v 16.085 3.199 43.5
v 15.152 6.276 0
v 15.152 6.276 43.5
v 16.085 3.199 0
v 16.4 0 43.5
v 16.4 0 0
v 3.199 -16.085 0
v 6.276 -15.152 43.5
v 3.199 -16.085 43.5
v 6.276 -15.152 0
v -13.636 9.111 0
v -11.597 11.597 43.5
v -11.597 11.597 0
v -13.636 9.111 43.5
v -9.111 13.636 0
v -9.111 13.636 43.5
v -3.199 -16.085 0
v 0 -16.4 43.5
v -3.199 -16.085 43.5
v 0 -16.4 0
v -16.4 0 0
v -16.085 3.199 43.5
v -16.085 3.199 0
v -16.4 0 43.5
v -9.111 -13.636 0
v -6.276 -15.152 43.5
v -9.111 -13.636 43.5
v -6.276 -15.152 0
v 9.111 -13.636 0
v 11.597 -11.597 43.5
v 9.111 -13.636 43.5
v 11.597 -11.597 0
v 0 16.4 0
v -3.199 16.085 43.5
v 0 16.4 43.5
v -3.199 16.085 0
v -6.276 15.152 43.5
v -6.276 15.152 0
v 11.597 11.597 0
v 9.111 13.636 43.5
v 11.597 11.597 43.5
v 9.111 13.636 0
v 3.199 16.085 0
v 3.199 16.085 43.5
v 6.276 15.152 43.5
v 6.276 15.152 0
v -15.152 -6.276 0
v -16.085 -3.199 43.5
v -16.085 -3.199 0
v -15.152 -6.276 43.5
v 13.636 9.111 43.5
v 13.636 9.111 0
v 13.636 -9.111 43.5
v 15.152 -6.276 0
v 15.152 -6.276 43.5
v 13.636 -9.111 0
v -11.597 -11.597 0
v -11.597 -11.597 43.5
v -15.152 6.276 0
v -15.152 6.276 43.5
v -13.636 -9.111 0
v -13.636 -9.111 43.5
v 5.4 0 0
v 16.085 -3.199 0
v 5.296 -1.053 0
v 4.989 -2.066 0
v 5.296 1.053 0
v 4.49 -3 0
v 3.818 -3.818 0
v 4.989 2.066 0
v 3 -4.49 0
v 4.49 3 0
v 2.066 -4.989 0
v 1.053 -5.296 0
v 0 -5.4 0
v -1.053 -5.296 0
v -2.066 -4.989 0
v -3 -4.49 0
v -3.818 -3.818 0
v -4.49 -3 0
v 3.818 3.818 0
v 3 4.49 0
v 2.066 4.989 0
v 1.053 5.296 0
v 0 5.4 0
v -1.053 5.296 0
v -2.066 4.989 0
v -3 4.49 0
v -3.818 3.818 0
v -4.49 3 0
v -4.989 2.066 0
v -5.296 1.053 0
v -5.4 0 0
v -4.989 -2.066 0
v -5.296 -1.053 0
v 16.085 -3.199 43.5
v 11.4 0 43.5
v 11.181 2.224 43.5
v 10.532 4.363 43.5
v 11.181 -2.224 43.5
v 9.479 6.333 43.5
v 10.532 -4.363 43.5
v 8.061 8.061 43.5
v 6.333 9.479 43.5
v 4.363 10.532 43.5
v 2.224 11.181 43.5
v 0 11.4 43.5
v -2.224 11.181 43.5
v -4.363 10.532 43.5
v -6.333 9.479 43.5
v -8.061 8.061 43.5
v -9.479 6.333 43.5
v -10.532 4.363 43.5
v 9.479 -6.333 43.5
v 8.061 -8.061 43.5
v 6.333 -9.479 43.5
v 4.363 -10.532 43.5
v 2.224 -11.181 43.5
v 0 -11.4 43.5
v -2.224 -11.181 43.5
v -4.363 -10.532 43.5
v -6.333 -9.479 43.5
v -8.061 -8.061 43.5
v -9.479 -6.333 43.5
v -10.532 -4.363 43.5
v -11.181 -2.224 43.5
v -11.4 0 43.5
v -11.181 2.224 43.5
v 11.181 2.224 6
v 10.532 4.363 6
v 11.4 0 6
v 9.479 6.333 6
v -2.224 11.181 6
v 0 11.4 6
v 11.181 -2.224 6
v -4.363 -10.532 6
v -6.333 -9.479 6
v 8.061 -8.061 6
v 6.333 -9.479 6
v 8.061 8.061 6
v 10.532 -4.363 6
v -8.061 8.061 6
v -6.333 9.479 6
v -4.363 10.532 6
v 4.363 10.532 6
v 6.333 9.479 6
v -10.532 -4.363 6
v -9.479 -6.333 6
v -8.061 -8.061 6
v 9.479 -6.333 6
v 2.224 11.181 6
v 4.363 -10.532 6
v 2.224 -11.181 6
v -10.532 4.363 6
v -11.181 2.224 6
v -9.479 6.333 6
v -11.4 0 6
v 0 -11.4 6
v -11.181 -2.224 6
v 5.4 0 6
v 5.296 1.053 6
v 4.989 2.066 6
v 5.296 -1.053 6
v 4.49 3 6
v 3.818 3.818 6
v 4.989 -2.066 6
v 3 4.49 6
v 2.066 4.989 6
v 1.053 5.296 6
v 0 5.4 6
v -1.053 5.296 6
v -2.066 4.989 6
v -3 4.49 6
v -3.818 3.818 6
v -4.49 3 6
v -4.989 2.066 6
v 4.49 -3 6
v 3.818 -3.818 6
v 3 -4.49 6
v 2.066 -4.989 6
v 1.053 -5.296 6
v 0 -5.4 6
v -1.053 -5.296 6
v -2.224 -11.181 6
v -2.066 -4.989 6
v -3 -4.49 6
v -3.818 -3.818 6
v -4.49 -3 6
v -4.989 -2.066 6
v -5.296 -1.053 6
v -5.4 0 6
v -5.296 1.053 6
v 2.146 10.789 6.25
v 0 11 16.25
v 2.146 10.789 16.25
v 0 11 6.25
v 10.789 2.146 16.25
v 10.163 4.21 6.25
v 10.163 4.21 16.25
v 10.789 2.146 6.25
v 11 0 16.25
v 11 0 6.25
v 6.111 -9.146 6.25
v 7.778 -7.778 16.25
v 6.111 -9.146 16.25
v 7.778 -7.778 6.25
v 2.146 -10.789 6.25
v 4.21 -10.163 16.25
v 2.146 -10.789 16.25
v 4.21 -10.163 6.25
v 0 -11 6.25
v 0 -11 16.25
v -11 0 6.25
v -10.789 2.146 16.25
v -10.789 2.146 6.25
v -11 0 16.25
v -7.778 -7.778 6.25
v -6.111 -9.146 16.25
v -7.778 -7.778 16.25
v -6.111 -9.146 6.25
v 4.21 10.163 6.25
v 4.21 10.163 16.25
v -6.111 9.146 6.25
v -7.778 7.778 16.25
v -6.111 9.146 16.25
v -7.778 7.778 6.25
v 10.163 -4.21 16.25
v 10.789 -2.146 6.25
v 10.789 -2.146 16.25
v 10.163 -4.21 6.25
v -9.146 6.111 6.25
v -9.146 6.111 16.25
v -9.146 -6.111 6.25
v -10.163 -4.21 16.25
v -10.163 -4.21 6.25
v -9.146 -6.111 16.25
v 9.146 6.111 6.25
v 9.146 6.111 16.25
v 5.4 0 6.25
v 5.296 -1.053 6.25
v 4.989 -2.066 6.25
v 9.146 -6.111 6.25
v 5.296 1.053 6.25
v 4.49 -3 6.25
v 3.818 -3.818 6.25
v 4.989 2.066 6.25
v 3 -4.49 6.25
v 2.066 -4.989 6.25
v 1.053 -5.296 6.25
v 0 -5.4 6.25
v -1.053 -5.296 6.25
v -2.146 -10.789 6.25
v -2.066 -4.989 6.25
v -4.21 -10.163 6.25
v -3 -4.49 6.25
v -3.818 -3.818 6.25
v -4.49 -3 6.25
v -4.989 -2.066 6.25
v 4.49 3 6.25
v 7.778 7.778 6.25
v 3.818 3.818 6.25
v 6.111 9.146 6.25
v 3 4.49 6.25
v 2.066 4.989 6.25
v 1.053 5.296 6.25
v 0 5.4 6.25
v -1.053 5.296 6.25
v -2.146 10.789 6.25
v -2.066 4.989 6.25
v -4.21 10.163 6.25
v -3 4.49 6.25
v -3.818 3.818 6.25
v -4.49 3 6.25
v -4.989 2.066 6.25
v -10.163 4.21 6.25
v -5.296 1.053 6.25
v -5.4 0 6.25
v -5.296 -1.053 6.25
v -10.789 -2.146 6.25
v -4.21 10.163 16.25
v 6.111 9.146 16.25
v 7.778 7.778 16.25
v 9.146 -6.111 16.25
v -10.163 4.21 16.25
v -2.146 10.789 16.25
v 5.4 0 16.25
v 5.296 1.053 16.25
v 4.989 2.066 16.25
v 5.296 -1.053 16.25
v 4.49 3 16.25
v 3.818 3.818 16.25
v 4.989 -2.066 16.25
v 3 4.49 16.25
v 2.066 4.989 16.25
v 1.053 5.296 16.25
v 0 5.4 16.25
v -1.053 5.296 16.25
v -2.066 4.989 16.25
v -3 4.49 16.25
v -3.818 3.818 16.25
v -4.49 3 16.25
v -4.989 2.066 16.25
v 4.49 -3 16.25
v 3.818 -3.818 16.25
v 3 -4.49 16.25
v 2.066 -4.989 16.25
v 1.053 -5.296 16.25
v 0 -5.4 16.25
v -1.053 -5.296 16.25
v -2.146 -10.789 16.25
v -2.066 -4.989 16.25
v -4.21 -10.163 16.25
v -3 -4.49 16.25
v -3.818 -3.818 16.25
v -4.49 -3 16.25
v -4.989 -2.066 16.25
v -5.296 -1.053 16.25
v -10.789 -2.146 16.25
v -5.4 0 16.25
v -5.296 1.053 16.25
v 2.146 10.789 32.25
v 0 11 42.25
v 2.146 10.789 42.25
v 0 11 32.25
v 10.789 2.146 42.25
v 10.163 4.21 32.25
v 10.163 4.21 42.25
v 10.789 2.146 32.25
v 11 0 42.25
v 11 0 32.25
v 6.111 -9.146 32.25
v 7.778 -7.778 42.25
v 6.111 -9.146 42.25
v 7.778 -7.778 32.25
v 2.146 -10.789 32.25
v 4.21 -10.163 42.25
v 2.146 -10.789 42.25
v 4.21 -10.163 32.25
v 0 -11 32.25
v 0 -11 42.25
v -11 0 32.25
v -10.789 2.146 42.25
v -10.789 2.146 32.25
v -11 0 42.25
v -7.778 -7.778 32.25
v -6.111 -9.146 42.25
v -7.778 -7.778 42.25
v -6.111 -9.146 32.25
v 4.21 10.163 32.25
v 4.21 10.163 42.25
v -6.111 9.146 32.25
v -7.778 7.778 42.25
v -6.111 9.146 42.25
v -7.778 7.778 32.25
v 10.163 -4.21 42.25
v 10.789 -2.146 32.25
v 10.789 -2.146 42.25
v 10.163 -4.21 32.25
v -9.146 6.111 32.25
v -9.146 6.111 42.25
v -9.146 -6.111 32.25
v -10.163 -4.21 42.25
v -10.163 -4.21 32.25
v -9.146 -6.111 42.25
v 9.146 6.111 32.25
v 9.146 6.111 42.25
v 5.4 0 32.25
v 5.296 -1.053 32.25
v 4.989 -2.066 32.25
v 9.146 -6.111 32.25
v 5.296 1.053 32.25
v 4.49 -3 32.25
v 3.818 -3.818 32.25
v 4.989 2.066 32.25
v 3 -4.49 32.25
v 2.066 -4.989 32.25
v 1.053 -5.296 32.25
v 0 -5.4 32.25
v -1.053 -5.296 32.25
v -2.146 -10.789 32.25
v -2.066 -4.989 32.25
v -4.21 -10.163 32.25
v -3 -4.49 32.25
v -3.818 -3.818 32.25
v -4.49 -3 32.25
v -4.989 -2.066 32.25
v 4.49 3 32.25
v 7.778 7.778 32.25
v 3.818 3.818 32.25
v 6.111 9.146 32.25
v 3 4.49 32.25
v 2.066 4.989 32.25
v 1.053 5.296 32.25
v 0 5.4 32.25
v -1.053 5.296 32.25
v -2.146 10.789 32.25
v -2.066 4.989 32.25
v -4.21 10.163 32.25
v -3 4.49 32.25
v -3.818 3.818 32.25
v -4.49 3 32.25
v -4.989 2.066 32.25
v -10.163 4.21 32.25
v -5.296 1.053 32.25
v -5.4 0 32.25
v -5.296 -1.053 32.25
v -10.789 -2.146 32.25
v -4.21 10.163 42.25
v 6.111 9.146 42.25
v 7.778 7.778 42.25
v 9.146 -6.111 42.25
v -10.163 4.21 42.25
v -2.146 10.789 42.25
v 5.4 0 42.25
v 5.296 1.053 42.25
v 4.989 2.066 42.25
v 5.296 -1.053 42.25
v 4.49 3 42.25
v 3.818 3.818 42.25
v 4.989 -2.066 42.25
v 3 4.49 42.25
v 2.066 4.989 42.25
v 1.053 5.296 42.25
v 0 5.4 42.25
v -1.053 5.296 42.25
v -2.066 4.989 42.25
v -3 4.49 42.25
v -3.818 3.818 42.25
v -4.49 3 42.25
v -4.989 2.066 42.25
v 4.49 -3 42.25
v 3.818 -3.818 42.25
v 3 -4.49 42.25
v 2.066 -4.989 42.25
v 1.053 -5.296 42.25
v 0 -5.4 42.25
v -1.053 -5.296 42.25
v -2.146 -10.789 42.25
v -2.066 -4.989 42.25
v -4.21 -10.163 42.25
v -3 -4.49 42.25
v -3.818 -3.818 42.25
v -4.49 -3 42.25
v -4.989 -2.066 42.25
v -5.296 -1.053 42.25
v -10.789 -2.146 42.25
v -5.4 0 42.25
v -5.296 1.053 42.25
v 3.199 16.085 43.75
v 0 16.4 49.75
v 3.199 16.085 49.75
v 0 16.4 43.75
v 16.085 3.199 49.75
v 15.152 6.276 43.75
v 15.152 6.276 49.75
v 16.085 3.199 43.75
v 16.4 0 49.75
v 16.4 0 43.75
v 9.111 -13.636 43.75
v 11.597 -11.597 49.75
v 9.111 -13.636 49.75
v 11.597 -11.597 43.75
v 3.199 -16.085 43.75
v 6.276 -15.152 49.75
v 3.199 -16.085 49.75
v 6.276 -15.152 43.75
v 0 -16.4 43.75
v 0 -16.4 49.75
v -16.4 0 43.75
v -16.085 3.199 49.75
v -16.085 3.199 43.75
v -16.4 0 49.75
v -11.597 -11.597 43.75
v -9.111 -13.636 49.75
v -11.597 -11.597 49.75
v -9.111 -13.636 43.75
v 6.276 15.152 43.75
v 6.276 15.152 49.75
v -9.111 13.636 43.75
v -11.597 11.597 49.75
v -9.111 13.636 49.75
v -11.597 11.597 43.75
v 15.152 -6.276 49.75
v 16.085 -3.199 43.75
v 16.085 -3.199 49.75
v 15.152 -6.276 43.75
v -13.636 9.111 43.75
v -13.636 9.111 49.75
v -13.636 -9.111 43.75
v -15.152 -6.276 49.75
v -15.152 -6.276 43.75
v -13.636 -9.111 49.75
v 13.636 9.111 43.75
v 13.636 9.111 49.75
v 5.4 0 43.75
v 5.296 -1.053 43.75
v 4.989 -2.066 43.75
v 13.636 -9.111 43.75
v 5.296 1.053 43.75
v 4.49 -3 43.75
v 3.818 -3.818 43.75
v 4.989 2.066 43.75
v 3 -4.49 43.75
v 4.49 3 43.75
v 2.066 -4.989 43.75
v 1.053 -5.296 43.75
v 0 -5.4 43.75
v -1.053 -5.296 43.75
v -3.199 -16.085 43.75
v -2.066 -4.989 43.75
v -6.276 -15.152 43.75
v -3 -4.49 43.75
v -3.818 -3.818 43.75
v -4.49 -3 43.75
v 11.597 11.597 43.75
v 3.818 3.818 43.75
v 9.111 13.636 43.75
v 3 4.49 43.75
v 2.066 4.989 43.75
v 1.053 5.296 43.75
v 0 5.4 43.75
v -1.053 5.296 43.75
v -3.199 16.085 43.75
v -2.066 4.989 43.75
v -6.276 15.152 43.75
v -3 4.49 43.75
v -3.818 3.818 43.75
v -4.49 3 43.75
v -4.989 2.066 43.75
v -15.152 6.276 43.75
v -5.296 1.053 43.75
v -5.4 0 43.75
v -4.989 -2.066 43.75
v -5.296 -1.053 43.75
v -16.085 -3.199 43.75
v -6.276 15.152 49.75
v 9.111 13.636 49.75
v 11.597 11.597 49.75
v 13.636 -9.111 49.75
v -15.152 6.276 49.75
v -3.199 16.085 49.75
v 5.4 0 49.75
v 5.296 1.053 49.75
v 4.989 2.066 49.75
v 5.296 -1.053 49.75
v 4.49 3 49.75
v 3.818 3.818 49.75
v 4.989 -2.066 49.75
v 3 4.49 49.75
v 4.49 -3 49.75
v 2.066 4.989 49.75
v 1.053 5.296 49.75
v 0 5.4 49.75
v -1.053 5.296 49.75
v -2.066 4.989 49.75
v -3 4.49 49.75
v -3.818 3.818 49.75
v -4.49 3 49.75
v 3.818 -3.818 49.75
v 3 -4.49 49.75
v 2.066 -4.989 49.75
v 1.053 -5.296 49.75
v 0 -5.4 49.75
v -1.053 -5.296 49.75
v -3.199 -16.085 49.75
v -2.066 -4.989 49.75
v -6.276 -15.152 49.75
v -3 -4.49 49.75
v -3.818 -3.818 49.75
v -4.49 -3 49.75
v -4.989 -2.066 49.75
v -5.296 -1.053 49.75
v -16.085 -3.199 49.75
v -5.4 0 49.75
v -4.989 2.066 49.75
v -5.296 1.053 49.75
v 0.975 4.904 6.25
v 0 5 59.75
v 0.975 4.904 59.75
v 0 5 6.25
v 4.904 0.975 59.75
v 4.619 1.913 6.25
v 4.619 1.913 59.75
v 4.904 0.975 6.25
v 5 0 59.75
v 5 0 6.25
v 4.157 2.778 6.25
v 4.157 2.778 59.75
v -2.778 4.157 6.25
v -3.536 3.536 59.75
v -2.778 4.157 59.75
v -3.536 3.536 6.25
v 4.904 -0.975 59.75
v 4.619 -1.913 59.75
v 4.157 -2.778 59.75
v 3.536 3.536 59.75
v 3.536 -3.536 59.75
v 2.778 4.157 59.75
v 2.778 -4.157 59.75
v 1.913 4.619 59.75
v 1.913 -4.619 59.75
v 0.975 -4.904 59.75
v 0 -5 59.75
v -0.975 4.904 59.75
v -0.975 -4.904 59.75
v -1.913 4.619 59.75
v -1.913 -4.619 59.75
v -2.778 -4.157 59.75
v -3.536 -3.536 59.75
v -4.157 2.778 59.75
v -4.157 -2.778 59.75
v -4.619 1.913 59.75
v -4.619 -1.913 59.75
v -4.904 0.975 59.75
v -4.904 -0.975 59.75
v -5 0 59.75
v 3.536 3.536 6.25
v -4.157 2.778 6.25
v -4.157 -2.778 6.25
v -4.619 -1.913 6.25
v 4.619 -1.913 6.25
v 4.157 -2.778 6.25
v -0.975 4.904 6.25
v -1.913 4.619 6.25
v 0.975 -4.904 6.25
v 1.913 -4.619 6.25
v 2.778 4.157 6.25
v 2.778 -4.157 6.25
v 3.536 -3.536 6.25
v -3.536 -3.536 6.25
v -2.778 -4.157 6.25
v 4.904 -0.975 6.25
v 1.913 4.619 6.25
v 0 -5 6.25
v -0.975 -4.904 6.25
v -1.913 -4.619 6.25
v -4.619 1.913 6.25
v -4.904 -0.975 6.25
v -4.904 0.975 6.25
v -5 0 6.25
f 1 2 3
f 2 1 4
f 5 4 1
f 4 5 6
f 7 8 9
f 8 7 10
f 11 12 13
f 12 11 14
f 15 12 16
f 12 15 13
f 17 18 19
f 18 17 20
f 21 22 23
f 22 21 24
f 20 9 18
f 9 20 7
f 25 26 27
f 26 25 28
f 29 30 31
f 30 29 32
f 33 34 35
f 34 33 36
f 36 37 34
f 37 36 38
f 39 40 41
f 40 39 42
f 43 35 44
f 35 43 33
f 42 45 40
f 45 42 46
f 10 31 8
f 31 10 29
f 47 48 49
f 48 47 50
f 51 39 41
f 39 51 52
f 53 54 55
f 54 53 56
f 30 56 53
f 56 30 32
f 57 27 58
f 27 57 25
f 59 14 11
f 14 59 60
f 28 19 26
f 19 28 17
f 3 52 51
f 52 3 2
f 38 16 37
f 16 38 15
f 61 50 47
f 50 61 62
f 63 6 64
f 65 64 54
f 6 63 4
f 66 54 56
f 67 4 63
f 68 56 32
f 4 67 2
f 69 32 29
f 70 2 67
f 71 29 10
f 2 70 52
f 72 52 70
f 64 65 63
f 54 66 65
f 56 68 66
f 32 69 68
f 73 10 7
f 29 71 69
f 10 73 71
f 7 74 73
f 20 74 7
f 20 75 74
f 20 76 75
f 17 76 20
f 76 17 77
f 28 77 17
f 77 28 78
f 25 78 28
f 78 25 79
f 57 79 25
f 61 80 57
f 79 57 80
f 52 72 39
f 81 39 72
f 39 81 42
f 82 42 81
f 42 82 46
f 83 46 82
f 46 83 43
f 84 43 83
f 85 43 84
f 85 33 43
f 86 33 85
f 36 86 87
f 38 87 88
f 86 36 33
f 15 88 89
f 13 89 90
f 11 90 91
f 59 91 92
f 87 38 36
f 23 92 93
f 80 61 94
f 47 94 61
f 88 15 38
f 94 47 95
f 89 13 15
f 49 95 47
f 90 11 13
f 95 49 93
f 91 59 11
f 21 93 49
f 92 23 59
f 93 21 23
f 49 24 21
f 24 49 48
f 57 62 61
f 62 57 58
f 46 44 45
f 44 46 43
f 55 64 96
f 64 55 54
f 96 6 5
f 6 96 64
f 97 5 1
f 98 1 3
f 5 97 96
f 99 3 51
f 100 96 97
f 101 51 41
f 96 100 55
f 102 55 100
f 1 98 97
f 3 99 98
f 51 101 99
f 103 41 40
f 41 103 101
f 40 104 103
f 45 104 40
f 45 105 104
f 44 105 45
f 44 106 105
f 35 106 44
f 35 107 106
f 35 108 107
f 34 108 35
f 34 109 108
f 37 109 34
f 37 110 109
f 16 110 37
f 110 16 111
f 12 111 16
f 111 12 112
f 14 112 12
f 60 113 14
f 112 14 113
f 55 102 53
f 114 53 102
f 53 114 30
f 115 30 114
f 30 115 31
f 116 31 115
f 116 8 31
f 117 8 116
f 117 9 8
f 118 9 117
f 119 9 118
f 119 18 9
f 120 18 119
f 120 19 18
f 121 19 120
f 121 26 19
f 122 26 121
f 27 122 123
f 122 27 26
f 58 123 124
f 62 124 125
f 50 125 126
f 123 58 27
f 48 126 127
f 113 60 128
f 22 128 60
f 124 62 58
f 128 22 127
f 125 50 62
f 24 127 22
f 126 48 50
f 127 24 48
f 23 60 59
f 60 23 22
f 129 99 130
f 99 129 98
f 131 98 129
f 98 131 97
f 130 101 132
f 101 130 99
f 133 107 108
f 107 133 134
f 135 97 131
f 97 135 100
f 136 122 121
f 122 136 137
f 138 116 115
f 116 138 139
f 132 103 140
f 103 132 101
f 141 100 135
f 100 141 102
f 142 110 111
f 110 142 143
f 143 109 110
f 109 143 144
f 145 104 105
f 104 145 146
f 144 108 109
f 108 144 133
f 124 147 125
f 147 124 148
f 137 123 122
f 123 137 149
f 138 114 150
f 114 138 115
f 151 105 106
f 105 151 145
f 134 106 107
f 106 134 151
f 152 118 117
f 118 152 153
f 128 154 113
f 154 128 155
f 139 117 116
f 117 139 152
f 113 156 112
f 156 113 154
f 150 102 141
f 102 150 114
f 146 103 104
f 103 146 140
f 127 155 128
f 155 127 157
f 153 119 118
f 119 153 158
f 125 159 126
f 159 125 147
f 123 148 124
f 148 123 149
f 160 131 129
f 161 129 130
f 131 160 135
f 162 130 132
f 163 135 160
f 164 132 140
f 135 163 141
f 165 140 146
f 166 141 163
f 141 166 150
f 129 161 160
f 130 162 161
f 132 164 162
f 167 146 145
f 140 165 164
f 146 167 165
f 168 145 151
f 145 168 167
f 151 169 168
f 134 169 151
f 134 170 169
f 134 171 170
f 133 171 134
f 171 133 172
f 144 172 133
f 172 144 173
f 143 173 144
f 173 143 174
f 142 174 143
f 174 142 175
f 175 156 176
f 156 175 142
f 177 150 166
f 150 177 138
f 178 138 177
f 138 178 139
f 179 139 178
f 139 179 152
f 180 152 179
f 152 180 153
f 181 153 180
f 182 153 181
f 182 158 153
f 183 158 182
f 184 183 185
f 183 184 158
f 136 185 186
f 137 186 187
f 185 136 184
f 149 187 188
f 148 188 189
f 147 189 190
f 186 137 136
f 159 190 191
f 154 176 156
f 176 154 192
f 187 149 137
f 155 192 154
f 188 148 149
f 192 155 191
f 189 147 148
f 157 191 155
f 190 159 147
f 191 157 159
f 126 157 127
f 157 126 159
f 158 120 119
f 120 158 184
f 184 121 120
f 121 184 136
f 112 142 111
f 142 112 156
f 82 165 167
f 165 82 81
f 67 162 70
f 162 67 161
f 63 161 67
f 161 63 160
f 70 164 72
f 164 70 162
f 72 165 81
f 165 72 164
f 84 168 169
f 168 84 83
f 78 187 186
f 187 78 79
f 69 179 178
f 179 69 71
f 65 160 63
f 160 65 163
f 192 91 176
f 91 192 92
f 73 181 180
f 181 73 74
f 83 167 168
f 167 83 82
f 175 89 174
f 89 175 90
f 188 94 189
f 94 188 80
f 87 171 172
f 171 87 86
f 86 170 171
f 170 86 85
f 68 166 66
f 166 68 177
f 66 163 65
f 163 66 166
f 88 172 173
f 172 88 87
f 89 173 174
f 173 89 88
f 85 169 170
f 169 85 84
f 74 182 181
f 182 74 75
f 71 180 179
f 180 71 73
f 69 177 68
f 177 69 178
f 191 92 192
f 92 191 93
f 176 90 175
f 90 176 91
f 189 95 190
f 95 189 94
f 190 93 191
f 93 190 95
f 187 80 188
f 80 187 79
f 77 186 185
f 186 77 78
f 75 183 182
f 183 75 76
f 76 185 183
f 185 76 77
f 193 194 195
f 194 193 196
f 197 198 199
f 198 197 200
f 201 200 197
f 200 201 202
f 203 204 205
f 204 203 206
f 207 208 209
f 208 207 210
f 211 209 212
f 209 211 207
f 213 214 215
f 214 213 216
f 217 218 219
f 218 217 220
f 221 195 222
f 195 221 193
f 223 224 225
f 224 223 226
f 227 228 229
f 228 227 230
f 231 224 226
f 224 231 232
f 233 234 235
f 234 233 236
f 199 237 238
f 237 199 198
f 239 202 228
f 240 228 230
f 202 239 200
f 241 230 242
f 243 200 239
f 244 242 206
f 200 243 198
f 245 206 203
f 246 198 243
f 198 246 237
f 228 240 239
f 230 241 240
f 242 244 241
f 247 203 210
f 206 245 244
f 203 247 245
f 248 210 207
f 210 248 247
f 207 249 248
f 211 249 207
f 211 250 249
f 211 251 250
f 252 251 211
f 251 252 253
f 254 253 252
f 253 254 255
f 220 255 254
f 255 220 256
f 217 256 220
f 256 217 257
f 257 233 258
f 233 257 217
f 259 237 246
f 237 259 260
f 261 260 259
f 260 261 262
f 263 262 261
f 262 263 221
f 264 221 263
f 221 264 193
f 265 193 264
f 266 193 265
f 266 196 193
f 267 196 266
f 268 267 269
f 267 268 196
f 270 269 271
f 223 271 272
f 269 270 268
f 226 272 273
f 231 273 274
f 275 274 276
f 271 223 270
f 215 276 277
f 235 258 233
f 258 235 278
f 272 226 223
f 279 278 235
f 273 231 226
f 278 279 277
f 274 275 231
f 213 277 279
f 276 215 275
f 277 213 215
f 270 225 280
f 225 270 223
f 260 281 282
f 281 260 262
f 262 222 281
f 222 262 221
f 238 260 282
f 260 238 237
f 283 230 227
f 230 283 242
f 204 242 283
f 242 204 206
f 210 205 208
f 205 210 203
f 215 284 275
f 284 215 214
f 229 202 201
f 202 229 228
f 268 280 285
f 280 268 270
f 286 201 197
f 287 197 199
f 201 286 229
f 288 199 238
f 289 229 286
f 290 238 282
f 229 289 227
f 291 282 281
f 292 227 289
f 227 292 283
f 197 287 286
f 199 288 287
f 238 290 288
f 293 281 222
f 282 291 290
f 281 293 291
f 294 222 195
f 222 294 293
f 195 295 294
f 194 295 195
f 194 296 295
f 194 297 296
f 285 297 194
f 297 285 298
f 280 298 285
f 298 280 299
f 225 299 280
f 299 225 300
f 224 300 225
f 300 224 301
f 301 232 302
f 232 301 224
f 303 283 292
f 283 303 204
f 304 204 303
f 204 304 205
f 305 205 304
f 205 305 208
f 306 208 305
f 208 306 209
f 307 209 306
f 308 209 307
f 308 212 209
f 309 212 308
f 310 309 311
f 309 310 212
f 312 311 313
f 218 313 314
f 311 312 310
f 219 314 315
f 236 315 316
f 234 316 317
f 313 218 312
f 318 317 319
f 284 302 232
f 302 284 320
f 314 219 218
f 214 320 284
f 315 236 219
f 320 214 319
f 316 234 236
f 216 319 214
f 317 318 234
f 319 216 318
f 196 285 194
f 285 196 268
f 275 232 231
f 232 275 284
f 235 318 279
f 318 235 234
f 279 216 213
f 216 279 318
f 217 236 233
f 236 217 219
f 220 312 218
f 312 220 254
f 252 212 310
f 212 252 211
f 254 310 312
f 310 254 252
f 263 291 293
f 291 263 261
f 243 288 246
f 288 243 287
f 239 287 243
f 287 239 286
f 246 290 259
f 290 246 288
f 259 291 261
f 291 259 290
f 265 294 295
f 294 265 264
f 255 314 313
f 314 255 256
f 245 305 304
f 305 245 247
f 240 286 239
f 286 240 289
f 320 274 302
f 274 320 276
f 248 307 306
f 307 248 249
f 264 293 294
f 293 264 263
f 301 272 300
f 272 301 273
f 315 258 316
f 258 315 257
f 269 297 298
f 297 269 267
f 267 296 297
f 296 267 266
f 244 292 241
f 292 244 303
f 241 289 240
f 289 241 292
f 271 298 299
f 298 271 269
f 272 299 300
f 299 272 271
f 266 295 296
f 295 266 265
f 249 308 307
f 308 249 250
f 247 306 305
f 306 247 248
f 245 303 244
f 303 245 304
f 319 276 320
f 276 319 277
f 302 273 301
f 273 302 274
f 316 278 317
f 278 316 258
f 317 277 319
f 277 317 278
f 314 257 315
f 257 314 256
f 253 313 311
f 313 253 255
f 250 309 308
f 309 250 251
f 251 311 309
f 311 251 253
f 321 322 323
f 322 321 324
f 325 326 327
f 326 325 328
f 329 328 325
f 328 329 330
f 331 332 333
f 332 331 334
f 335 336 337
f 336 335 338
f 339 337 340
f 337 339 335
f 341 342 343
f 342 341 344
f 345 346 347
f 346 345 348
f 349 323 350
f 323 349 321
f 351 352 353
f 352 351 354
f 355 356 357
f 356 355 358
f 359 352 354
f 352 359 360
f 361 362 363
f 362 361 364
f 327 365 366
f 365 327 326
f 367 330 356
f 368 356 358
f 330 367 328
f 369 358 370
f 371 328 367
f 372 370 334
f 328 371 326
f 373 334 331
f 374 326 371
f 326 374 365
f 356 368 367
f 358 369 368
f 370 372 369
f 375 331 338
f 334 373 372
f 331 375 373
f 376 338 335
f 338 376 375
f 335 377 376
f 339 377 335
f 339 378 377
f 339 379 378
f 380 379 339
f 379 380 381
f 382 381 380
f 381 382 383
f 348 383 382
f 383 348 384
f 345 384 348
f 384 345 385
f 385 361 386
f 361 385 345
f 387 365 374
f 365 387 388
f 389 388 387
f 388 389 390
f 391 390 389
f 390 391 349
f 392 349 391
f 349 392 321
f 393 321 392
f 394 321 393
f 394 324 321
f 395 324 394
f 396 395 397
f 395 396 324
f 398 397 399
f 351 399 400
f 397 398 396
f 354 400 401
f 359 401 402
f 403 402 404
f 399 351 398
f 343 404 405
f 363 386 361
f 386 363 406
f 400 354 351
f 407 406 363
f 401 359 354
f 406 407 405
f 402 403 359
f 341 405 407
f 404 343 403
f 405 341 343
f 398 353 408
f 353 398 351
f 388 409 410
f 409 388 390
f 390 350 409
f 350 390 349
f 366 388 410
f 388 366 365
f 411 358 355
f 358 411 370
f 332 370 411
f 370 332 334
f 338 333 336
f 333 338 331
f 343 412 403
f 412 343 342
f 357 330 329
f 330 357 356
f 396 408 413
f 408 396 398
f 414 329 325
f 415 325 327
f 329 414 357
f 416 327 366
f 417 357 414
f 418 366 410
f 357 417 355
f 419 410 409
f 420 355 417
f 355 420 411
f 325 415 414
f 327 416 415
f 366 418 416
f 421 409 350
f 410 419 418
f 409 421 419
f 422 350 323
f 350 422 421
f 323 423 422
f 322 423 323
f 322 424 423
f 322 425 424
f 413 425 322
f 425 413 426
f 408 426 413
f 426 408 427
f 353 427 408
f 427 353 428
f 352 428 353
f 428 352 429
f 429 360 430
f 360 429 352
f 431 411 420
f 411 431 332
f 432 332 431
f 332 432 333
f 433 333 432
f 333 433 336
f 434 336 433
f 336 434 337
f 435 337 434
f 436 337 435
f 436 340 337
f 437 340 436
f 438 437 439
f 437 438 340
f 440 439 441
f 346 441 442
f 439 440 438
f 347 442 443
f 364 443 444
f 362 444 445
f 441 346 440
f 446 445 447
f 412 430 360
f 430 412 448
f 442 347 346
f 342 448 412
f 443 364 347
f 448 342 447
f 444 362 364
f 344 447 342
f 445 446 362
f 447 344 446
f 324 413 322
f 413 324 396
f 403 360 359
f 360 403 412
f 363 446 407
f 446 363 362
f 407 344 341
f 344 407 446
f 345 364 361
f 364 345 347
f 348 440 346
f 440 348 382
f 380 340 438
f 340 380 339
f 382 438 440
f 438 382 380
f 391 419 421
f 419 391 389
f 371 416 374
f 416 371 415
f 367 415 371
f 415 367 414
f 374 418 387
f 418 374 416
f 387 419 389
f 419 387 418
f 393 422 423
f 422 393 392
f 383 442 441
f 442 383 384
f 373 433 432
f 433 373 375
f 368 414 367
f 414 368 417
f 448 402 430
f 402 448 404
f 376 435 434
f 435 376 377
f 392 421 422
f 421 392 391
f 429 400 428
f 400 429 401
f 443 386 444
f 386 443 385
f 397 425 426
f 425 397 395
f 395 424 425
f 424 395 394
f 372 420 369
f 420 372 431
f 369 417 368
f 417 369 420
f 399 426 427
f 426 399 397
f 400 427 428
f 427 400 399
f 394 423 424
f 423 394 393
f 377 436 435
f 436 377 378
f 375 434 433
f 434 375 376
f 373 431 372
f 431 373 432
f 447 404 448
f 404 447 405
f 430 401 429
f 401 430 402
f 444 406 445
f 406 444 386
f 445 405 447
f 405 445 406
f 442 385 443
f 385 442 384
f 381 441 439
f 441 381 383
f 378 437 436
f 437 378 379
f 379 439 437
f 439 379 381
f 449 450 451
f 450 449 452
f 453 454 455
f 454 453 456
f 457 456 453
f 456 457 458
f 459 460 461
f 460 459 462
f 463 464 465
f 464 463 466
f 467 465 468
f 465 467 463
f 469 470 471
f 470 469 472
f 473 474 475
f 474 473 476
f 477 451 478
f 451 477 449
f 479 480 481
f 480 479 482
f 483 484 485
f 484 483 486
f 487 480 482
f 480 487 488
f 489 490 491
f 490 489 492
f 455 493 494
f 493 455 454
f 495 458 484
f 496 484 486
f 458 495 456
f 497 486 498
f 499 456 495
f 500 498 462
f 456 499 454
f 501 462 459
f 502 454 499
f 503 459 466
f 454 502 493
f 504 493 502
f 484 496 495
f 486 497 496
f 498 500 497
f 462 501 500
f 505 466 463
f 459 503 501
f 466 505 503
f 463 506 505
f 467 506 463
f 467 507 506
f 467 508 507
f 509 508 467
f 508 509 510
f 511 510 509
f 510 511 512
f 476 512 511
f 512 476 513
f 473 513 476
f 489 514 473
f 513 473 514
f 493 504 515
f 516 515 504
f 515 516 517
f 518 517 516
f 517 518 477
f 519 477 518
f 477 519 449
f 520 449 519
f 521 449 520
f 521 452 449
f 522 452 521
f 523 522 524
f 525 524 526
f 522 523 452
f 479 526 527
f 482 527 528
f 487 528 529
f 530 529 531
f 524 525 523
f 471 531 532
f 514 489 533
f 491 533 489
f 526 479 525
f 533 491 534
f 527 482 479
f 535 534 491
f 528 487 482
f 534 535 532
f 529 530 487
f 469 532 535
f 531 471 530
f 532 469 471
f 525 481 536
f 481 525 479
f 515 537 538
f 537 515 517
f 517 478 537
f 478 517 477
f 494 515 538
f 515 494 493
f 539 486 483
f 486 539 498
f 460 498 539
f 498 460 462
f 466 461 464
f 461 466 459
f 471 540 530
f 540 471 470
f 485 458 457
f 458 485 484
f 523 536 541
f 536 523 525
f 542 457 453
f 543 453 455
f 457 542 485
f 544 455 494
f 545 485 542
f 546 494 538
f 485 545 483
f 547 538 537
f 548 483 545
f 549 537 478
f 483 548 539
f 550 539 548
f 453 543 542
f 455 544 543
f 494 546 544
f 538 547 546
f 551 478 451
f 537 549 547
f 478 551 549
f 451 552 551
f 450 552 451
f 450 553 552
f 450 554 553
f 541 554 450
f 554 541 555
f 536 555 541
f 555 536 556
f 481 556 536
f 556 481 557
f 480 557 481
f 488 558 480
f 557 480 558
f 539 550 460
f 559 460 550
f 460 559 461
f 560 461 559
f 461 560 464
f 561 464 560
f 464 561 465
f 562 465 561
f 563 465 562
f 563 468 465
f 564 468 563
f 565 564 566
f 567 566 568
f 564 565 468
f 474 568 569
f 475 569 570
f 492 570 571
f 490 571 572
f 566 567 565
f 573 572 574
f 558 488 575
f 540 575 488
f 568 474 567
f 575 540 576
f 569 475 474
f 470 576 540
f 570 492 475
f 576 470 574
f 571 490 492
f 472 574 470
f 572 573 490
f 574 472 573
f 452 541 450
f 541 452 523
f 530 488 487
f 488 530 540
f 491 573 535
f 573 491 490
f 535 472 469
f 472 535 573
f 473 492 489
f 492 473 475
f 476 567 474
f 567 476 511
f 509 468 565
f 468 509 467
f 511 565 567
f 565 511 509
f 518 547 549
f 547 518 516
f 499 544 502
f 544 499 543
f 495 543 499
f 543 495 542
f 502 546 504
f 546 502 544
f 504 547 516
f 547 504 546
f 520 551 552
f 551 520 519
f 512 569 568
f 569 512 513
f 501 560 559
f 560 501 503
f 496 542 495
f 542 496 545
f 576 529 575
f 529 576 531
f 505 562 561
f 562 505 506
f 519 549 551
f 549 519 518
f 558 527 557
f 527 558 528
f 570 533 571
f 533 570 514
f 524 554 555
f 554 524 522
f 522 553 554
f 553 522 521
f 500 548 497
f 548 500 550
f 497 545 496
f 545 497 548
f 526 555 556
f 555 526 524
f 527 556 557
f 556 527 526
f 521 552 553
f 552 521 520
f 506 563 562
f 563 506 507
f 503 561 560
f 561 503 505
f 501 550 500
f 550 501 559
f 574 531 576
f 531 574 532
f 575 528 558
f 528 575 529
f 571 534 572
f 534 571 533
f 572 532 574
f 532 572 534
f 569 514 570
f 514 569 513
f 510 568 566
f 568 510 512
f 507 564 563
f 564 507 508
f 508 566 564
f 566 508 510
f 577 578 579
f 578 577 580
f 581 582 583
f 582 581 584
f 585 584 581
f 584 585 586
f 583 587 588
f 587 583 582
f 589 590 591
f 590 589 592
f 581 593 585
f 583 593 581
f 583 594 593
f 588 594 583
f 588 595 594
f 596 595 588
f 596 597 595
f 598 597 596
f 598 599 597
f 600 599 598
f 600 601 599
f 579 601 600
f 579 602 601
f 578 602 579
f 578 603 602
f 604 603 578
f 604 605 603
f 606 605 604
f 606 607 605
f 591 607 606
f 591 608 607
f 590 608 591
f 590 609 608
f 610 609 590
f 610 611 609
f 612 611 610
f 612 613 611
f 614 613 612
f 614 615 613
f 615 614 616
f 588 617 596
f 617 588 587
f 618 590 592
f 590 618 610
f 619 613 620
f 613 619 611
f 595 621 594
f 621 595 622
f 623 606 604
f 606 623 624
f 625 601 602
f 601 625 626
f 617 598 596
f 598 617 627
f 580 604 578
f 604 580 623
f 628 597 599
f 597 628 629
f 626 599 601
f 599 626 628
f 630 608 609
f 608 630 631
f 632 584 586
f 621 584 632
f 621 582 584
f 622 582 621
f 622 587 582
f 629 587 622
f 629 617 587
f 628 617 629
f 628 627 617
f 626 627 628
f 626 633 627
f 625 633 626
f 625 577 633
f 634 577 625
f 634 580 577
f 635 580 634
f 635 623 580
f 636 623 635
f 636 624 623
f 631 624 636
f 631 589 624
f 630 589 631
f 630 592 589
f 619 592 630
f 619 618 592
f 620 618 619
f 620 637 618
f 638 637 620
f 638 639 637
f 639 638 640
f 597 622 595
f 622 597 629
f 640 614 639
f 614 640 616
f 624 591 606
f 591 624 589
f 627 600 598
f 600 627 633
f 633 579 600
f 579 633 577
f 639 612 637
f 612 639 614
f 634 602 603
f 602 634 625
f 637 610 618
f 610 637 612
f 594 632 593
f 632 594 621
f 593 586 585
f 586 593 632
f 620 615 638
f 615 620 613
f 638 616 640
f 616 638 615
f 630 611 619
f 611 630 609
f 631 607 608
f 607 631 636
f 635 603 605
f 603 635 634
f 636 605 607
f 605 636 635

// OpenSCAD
$fn = 32;

// ------------------------------------------------------------------------
// Shaft station: cup d32.8 x 43.5 mm, shaft d10
// Every part is its own module, assembly() places every instance.
// ------------------------------------------------------------------------

// --- part 1 ---
module housing_cup() {
  difference() {
    cylinder(h = 43.5, d = 32.8);
    translate([0, 0, 6]) cylinder(h = 38.5, d = 22.8);
    translate([0, 0, -1]) cylinder(h = 8, d = 10.8);
  }
}

// --- part 2 ---
module bearing_lower() {
  difference() {
      translate([0, 0, 0]) cylinder(h = 10, d = 22);
      translate([0, 0, -1]) cylinder(h = 12, d = 10.8);
    }
}

// --- part 3 ---
module bearing_upper() {
  difference() {
      translate([0, 0, 0]) cylinder(h = 10, d = 22);
      translate([0, 0, -1]) cylinder(h = 12, d = 10.8);
    }
}

// --- part 4 ---
module station_shaft() {
  translate([0, 0, -26.75]) cylinder(h = 53.5, d = 10);
}

// --- part 5 ---
module station_cover() {
  difference() {
    cylinder(h = 6, d = 32.8);
    translate([0, 0, -1]) cylinder(h = 8, d = 10.8);
  }
}

// --- assembly ---
module assembly() {
  color([0.80, 0.24, 0.20]) translate([0, 0, 0]) rotate([0, 0, 0]) housing_cup();
  color([0.20, 0.45, 0.75]) translate([0, 0, 6.25]) rotate([0, 0, 0]) bearing_lower();
  color([0.25, 0.62, 0.32]) translate([0, 0, 32.25]) rotate([0, 0, 0]) bearing_upper();
  color([0.92, 0.70, 0.18]) translate([0, 0, 33]) rotate([0, 0, 0]) station_shaft();
  color([0.58, 0.35, 0.70]) translate([0, 0, 43.75]) rotate([0, 0, 0]) station_cover();
}

assembly();
